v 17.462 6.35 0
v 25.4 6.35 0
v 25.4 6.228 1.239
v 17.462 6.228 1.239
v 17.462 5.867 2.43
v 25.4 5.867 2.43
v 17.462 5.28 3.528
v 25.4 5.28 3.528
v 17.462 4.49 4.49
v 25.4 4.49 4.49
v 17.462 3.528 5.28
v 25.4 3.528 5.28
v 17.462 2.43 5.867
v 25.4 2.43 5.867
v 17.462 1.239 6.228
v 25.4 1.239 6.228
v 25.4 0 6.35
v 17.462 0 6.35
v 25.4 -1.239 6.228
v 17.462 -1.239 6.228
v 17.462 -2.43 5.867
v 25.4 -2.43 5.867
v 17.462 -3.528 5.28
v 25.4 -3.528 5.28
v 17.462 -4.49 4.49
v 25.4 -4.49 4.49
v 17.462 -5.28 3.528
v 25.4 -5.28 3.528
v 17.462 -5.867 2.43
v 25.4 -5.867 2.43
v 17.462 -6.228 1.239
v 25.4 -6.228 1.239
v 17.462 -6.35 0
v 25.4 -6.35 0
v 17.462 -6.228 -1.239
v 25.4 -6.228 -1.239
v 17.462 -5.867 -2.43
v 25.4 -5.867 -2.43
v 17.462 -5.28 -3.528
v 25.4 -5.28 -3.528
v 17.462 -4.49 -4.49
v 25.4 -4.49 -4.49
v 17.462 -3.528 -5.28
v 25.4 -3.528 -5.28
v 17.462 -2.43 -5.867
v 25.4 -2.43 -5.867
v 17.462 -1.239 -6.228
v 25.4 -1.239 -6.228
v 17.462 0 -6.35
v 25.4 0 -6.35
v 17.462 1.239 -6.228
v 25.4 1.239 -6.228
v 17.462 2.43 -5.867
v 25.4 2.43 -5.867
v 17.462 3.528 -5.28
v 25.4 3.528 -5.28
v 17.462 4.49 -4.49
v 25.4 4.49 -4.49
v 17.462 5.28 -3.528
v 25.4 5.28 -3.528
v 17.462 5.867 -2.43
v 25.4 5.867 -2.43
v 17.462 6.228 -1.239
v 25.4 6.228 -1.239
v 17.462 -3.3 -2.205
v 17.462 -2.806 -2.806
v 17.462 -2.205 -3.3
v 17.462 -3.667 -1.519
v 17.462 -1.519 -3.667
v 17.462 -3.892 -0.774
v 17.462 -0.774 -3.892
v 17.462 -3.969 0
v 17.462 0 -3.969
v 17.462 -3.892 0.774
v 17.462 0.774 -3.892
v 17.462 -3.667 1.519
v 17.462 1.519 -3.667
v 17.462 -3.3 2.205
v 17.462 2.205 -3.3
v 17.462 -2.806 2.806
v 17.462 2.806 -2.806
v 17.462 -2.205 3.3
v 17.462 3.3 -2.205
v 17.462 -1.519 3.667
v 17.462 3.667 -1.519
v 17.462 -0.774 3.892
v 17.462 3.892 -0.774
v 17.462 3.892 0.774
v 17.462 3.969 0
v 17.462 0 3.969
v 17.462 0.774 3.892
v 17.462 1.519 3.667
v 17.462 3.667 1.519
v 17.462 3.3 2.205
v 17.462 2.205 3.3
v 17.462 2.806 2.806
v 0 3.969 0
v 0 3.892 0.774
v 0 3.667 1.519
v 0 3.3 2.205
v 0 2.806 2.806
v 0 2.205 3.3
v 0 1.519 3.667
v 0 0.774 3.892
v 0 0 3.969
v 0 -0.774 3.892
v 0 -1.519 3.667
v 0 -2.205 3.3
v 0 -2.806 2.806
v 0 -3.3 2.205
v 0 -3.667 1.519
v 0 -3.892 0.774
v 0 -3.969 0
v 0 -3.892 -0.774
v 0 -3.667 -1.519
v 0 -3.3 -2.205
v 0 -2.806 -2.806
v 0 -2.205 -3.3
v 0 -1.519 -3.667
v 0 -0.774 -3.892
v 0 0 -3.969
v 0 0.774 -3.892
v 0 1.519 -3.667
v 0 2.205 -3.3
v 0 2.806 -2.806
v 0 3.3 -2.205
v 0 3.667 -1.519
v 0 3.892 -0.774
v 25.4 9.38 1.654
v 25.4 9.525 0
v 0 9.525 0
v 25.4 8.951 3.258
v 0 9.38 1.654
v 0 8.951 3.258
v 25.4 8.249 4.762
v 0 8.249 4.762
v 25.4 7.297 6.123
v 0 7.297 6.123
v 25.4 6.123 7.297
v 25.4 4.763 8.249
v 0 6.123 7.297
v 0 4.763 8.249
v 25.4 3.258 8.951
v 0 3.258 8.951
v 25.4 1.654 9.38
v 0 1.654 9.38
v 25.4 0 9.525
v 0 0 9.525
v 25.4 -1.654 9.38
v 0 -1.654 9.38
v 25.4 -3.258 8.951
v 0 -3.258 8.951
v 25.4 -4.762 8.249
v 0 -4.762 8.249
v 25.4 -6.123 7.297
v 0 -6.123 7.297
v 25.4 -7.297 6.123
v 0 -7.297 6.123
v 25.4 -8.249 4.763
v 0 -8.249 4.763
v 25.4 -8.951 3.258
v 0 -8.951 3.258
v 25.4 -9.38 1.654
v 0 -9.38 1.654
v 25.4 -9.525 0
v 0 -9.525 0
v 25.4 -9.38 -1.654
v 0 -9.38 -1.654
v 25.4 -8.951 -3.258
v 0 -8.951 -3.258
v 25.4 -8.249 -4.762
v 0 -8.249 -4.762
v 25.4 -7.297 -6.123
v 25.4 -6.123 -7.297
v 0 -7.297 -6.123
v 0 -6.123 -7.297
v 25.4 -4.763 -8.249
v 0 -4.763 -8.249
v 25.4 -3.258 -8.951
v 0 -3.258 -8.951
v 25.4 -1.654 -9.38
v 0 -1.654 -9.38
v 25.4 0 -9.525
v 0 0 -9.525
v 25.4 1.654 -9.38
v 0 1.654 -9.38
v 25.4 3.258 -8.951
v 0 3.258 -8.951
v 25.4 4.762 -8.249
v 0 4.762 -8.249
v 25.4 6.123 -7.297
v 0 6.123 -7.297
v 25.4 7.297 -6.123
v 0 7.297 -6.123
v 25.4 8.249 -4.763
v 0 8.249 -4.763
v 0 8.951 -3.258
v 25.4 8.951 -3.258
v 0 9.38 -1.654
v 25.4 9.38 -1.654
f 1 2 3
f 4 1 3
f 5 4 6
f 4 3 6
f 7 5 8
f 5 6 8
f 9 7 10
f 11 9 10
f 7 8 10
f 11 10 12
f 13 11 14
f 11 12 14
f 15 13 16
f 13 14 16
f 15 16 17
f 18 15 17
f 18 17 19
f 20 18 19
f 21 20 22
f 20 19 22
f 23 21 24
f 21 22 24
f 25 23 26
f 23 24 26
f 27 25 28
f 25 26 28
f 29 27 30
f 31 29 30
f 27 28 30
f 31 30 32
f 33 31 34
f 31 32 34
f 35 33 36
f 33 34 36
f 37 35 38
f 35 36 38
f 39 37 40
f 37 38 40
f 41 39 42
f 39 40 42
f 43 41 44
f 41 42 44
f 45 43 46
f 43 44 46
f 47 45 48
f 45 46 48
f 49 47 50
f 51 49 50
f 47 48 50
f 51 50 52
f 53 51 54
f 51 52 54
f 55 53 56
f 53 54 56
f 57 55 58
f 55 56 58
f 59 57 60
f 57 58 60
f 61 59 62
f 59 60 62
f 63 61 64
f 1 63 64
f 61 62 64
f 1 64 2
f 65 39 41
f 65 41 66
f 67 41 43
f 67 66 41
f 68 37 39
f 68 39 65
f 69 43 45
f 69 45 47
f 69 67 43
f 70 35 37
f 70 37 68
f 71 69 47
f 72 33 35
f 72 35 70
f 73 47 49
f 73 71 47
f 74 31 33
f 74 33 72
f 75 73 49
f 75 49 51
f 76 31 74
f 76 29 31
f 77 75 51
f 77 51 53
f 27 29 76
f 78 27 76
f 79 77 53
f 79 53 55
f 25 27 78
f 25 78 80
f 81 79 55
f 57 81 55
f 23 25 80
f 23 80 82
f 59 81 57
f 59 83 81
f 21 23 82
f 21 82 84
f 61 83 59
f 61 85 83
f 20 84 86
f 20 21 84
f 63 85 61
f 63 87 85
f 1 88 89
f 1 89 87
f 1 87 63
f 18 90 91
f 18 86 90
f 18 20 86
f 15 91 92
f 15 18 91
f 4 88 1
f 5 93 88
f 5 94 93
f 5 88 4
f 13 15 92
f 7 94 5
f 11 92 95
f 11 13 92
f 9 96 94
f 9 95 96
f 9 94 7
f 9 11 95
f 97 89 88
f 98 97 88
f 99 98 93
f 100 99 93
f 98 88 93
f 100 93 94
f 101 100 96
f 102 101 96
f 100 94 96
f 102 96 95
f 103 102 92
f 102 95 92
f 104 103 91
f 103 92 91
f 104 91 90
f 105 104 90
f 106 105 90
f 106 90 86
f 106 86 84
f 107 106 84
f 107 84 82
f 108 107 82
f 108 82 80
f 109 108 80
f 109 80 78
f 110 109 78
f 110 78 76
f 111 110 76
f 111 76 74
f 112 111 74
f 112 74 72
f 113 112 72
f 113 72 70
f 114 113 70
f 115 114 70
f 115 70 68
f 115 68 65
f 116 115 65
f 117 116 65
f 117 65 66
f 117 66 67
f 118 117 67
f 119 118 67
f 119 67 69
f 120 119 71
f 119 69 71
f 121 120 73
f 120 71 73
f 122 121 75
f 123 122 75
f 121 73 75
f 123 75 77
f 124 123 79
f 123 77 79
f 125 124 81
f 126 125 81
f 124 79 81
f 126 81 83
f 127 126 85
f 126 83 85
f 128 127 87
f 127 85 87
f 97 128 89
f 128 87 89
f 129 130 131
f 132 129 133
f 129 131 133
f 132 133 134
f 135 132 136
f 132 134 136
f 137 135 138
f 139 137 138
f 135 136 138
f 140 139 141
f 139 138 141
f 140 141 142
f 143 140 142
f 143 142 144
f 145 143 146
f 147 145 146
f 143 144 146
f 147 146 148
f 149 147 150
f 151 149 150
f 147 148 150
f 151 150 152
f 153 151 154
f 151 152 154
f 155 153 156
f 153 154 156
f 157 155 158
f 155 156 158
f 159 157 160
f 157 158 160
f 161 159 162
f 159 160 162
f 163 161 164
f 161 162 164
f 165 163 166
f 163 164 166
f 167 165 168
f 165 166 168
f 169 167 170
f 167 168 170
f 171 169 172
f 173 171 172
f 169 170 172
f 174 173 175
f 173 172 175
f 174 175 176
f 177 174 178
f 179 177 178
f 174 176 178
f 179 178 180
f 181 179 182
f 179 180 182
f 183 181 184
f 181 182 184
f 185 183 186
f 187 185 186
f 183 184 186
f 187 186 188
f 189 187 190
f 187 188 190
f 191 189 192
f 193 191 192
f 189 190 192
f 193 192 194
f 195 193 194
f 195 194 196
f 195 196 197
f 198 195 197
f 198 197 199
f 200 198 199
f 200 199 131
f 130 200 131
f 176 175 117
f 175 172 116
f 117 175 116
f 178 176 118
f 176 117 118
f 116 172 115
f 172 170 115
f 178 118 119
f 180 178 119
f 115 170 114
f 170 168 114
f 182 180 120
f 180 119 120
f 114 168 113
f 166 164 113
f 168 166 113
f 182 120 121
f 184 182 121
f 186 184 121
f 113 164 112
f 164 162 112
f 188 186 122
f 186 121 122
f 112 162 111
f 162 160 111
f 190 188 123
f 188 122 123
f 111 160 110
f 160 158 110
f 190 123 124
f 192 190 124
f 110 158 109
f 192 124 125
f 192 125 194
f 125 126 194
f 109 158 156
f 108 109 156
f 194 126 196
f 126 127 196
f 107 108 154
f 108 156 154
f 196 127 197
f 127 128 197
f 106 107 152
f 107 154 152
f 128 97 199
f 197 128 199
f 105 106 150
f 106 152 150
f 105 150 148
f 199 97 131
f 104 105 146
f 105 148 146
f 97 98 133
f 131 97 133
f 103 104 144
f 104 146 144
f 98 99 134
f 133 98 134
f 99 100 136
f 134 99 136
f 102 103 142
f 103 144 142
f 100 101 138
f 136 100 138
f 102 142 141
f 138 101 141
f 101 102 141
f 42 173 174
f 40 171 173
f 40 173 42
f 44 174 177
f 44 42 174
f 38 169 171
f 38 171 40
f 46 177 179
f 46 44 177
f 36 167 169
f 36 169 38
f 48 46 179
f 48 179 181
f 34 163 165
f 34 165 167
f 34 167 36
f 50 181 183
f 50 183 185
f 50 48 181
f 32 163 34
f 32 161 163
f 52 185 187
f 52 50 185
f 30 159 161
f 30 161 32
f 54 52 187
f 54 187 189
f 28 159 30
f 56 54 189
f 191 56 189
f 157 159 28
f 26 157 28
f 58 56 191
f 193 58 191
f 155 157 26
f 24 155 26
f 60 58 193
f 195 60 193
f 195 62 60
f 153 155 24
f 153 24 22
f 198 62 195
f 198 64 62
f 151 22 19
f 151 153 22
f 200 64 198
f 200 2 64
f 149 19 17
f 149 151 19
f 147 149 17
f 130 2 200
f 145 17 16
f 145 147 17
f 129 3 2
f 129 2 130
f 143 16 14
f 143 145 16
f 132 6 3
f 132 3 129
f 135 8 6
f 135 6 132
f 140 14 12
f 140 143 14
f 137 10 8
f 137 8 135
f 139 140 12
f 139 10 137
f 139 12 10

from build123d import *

# Parameters (mm, degrees)
F0_R     = 9.525
F1_DEPTH = 25.4
F2_R     = 6.35
F3_DEPTH = 7.9375
F4_R     = 3.96875
F5_DEPTH = 17.4635


with BuildPart() as f1:
    # F0 (on Right) → F1 (new body)
    with BuildSketch(Plane.YZ):
        Circle(F0_R)
    extrude(amount=F1_DEPTH)

    # F2 (on face) → F3 (cut)
    with BuildSketch(Plane.YZ.offset(25.4)):
        Circle(F2_R)
    extrude(amount=-F3_DEPTH, mode=Mode.SUBTRACT)

    # F4 (on face) → F5 (cut, through all)
    with BuildSketch(Plane.YZ.offset(17.4625)):
        Circle(F4_R)
    extrude(amount=-F5_DEPTH, mode=Mode.SUBTRACT)


solid = f1.part
